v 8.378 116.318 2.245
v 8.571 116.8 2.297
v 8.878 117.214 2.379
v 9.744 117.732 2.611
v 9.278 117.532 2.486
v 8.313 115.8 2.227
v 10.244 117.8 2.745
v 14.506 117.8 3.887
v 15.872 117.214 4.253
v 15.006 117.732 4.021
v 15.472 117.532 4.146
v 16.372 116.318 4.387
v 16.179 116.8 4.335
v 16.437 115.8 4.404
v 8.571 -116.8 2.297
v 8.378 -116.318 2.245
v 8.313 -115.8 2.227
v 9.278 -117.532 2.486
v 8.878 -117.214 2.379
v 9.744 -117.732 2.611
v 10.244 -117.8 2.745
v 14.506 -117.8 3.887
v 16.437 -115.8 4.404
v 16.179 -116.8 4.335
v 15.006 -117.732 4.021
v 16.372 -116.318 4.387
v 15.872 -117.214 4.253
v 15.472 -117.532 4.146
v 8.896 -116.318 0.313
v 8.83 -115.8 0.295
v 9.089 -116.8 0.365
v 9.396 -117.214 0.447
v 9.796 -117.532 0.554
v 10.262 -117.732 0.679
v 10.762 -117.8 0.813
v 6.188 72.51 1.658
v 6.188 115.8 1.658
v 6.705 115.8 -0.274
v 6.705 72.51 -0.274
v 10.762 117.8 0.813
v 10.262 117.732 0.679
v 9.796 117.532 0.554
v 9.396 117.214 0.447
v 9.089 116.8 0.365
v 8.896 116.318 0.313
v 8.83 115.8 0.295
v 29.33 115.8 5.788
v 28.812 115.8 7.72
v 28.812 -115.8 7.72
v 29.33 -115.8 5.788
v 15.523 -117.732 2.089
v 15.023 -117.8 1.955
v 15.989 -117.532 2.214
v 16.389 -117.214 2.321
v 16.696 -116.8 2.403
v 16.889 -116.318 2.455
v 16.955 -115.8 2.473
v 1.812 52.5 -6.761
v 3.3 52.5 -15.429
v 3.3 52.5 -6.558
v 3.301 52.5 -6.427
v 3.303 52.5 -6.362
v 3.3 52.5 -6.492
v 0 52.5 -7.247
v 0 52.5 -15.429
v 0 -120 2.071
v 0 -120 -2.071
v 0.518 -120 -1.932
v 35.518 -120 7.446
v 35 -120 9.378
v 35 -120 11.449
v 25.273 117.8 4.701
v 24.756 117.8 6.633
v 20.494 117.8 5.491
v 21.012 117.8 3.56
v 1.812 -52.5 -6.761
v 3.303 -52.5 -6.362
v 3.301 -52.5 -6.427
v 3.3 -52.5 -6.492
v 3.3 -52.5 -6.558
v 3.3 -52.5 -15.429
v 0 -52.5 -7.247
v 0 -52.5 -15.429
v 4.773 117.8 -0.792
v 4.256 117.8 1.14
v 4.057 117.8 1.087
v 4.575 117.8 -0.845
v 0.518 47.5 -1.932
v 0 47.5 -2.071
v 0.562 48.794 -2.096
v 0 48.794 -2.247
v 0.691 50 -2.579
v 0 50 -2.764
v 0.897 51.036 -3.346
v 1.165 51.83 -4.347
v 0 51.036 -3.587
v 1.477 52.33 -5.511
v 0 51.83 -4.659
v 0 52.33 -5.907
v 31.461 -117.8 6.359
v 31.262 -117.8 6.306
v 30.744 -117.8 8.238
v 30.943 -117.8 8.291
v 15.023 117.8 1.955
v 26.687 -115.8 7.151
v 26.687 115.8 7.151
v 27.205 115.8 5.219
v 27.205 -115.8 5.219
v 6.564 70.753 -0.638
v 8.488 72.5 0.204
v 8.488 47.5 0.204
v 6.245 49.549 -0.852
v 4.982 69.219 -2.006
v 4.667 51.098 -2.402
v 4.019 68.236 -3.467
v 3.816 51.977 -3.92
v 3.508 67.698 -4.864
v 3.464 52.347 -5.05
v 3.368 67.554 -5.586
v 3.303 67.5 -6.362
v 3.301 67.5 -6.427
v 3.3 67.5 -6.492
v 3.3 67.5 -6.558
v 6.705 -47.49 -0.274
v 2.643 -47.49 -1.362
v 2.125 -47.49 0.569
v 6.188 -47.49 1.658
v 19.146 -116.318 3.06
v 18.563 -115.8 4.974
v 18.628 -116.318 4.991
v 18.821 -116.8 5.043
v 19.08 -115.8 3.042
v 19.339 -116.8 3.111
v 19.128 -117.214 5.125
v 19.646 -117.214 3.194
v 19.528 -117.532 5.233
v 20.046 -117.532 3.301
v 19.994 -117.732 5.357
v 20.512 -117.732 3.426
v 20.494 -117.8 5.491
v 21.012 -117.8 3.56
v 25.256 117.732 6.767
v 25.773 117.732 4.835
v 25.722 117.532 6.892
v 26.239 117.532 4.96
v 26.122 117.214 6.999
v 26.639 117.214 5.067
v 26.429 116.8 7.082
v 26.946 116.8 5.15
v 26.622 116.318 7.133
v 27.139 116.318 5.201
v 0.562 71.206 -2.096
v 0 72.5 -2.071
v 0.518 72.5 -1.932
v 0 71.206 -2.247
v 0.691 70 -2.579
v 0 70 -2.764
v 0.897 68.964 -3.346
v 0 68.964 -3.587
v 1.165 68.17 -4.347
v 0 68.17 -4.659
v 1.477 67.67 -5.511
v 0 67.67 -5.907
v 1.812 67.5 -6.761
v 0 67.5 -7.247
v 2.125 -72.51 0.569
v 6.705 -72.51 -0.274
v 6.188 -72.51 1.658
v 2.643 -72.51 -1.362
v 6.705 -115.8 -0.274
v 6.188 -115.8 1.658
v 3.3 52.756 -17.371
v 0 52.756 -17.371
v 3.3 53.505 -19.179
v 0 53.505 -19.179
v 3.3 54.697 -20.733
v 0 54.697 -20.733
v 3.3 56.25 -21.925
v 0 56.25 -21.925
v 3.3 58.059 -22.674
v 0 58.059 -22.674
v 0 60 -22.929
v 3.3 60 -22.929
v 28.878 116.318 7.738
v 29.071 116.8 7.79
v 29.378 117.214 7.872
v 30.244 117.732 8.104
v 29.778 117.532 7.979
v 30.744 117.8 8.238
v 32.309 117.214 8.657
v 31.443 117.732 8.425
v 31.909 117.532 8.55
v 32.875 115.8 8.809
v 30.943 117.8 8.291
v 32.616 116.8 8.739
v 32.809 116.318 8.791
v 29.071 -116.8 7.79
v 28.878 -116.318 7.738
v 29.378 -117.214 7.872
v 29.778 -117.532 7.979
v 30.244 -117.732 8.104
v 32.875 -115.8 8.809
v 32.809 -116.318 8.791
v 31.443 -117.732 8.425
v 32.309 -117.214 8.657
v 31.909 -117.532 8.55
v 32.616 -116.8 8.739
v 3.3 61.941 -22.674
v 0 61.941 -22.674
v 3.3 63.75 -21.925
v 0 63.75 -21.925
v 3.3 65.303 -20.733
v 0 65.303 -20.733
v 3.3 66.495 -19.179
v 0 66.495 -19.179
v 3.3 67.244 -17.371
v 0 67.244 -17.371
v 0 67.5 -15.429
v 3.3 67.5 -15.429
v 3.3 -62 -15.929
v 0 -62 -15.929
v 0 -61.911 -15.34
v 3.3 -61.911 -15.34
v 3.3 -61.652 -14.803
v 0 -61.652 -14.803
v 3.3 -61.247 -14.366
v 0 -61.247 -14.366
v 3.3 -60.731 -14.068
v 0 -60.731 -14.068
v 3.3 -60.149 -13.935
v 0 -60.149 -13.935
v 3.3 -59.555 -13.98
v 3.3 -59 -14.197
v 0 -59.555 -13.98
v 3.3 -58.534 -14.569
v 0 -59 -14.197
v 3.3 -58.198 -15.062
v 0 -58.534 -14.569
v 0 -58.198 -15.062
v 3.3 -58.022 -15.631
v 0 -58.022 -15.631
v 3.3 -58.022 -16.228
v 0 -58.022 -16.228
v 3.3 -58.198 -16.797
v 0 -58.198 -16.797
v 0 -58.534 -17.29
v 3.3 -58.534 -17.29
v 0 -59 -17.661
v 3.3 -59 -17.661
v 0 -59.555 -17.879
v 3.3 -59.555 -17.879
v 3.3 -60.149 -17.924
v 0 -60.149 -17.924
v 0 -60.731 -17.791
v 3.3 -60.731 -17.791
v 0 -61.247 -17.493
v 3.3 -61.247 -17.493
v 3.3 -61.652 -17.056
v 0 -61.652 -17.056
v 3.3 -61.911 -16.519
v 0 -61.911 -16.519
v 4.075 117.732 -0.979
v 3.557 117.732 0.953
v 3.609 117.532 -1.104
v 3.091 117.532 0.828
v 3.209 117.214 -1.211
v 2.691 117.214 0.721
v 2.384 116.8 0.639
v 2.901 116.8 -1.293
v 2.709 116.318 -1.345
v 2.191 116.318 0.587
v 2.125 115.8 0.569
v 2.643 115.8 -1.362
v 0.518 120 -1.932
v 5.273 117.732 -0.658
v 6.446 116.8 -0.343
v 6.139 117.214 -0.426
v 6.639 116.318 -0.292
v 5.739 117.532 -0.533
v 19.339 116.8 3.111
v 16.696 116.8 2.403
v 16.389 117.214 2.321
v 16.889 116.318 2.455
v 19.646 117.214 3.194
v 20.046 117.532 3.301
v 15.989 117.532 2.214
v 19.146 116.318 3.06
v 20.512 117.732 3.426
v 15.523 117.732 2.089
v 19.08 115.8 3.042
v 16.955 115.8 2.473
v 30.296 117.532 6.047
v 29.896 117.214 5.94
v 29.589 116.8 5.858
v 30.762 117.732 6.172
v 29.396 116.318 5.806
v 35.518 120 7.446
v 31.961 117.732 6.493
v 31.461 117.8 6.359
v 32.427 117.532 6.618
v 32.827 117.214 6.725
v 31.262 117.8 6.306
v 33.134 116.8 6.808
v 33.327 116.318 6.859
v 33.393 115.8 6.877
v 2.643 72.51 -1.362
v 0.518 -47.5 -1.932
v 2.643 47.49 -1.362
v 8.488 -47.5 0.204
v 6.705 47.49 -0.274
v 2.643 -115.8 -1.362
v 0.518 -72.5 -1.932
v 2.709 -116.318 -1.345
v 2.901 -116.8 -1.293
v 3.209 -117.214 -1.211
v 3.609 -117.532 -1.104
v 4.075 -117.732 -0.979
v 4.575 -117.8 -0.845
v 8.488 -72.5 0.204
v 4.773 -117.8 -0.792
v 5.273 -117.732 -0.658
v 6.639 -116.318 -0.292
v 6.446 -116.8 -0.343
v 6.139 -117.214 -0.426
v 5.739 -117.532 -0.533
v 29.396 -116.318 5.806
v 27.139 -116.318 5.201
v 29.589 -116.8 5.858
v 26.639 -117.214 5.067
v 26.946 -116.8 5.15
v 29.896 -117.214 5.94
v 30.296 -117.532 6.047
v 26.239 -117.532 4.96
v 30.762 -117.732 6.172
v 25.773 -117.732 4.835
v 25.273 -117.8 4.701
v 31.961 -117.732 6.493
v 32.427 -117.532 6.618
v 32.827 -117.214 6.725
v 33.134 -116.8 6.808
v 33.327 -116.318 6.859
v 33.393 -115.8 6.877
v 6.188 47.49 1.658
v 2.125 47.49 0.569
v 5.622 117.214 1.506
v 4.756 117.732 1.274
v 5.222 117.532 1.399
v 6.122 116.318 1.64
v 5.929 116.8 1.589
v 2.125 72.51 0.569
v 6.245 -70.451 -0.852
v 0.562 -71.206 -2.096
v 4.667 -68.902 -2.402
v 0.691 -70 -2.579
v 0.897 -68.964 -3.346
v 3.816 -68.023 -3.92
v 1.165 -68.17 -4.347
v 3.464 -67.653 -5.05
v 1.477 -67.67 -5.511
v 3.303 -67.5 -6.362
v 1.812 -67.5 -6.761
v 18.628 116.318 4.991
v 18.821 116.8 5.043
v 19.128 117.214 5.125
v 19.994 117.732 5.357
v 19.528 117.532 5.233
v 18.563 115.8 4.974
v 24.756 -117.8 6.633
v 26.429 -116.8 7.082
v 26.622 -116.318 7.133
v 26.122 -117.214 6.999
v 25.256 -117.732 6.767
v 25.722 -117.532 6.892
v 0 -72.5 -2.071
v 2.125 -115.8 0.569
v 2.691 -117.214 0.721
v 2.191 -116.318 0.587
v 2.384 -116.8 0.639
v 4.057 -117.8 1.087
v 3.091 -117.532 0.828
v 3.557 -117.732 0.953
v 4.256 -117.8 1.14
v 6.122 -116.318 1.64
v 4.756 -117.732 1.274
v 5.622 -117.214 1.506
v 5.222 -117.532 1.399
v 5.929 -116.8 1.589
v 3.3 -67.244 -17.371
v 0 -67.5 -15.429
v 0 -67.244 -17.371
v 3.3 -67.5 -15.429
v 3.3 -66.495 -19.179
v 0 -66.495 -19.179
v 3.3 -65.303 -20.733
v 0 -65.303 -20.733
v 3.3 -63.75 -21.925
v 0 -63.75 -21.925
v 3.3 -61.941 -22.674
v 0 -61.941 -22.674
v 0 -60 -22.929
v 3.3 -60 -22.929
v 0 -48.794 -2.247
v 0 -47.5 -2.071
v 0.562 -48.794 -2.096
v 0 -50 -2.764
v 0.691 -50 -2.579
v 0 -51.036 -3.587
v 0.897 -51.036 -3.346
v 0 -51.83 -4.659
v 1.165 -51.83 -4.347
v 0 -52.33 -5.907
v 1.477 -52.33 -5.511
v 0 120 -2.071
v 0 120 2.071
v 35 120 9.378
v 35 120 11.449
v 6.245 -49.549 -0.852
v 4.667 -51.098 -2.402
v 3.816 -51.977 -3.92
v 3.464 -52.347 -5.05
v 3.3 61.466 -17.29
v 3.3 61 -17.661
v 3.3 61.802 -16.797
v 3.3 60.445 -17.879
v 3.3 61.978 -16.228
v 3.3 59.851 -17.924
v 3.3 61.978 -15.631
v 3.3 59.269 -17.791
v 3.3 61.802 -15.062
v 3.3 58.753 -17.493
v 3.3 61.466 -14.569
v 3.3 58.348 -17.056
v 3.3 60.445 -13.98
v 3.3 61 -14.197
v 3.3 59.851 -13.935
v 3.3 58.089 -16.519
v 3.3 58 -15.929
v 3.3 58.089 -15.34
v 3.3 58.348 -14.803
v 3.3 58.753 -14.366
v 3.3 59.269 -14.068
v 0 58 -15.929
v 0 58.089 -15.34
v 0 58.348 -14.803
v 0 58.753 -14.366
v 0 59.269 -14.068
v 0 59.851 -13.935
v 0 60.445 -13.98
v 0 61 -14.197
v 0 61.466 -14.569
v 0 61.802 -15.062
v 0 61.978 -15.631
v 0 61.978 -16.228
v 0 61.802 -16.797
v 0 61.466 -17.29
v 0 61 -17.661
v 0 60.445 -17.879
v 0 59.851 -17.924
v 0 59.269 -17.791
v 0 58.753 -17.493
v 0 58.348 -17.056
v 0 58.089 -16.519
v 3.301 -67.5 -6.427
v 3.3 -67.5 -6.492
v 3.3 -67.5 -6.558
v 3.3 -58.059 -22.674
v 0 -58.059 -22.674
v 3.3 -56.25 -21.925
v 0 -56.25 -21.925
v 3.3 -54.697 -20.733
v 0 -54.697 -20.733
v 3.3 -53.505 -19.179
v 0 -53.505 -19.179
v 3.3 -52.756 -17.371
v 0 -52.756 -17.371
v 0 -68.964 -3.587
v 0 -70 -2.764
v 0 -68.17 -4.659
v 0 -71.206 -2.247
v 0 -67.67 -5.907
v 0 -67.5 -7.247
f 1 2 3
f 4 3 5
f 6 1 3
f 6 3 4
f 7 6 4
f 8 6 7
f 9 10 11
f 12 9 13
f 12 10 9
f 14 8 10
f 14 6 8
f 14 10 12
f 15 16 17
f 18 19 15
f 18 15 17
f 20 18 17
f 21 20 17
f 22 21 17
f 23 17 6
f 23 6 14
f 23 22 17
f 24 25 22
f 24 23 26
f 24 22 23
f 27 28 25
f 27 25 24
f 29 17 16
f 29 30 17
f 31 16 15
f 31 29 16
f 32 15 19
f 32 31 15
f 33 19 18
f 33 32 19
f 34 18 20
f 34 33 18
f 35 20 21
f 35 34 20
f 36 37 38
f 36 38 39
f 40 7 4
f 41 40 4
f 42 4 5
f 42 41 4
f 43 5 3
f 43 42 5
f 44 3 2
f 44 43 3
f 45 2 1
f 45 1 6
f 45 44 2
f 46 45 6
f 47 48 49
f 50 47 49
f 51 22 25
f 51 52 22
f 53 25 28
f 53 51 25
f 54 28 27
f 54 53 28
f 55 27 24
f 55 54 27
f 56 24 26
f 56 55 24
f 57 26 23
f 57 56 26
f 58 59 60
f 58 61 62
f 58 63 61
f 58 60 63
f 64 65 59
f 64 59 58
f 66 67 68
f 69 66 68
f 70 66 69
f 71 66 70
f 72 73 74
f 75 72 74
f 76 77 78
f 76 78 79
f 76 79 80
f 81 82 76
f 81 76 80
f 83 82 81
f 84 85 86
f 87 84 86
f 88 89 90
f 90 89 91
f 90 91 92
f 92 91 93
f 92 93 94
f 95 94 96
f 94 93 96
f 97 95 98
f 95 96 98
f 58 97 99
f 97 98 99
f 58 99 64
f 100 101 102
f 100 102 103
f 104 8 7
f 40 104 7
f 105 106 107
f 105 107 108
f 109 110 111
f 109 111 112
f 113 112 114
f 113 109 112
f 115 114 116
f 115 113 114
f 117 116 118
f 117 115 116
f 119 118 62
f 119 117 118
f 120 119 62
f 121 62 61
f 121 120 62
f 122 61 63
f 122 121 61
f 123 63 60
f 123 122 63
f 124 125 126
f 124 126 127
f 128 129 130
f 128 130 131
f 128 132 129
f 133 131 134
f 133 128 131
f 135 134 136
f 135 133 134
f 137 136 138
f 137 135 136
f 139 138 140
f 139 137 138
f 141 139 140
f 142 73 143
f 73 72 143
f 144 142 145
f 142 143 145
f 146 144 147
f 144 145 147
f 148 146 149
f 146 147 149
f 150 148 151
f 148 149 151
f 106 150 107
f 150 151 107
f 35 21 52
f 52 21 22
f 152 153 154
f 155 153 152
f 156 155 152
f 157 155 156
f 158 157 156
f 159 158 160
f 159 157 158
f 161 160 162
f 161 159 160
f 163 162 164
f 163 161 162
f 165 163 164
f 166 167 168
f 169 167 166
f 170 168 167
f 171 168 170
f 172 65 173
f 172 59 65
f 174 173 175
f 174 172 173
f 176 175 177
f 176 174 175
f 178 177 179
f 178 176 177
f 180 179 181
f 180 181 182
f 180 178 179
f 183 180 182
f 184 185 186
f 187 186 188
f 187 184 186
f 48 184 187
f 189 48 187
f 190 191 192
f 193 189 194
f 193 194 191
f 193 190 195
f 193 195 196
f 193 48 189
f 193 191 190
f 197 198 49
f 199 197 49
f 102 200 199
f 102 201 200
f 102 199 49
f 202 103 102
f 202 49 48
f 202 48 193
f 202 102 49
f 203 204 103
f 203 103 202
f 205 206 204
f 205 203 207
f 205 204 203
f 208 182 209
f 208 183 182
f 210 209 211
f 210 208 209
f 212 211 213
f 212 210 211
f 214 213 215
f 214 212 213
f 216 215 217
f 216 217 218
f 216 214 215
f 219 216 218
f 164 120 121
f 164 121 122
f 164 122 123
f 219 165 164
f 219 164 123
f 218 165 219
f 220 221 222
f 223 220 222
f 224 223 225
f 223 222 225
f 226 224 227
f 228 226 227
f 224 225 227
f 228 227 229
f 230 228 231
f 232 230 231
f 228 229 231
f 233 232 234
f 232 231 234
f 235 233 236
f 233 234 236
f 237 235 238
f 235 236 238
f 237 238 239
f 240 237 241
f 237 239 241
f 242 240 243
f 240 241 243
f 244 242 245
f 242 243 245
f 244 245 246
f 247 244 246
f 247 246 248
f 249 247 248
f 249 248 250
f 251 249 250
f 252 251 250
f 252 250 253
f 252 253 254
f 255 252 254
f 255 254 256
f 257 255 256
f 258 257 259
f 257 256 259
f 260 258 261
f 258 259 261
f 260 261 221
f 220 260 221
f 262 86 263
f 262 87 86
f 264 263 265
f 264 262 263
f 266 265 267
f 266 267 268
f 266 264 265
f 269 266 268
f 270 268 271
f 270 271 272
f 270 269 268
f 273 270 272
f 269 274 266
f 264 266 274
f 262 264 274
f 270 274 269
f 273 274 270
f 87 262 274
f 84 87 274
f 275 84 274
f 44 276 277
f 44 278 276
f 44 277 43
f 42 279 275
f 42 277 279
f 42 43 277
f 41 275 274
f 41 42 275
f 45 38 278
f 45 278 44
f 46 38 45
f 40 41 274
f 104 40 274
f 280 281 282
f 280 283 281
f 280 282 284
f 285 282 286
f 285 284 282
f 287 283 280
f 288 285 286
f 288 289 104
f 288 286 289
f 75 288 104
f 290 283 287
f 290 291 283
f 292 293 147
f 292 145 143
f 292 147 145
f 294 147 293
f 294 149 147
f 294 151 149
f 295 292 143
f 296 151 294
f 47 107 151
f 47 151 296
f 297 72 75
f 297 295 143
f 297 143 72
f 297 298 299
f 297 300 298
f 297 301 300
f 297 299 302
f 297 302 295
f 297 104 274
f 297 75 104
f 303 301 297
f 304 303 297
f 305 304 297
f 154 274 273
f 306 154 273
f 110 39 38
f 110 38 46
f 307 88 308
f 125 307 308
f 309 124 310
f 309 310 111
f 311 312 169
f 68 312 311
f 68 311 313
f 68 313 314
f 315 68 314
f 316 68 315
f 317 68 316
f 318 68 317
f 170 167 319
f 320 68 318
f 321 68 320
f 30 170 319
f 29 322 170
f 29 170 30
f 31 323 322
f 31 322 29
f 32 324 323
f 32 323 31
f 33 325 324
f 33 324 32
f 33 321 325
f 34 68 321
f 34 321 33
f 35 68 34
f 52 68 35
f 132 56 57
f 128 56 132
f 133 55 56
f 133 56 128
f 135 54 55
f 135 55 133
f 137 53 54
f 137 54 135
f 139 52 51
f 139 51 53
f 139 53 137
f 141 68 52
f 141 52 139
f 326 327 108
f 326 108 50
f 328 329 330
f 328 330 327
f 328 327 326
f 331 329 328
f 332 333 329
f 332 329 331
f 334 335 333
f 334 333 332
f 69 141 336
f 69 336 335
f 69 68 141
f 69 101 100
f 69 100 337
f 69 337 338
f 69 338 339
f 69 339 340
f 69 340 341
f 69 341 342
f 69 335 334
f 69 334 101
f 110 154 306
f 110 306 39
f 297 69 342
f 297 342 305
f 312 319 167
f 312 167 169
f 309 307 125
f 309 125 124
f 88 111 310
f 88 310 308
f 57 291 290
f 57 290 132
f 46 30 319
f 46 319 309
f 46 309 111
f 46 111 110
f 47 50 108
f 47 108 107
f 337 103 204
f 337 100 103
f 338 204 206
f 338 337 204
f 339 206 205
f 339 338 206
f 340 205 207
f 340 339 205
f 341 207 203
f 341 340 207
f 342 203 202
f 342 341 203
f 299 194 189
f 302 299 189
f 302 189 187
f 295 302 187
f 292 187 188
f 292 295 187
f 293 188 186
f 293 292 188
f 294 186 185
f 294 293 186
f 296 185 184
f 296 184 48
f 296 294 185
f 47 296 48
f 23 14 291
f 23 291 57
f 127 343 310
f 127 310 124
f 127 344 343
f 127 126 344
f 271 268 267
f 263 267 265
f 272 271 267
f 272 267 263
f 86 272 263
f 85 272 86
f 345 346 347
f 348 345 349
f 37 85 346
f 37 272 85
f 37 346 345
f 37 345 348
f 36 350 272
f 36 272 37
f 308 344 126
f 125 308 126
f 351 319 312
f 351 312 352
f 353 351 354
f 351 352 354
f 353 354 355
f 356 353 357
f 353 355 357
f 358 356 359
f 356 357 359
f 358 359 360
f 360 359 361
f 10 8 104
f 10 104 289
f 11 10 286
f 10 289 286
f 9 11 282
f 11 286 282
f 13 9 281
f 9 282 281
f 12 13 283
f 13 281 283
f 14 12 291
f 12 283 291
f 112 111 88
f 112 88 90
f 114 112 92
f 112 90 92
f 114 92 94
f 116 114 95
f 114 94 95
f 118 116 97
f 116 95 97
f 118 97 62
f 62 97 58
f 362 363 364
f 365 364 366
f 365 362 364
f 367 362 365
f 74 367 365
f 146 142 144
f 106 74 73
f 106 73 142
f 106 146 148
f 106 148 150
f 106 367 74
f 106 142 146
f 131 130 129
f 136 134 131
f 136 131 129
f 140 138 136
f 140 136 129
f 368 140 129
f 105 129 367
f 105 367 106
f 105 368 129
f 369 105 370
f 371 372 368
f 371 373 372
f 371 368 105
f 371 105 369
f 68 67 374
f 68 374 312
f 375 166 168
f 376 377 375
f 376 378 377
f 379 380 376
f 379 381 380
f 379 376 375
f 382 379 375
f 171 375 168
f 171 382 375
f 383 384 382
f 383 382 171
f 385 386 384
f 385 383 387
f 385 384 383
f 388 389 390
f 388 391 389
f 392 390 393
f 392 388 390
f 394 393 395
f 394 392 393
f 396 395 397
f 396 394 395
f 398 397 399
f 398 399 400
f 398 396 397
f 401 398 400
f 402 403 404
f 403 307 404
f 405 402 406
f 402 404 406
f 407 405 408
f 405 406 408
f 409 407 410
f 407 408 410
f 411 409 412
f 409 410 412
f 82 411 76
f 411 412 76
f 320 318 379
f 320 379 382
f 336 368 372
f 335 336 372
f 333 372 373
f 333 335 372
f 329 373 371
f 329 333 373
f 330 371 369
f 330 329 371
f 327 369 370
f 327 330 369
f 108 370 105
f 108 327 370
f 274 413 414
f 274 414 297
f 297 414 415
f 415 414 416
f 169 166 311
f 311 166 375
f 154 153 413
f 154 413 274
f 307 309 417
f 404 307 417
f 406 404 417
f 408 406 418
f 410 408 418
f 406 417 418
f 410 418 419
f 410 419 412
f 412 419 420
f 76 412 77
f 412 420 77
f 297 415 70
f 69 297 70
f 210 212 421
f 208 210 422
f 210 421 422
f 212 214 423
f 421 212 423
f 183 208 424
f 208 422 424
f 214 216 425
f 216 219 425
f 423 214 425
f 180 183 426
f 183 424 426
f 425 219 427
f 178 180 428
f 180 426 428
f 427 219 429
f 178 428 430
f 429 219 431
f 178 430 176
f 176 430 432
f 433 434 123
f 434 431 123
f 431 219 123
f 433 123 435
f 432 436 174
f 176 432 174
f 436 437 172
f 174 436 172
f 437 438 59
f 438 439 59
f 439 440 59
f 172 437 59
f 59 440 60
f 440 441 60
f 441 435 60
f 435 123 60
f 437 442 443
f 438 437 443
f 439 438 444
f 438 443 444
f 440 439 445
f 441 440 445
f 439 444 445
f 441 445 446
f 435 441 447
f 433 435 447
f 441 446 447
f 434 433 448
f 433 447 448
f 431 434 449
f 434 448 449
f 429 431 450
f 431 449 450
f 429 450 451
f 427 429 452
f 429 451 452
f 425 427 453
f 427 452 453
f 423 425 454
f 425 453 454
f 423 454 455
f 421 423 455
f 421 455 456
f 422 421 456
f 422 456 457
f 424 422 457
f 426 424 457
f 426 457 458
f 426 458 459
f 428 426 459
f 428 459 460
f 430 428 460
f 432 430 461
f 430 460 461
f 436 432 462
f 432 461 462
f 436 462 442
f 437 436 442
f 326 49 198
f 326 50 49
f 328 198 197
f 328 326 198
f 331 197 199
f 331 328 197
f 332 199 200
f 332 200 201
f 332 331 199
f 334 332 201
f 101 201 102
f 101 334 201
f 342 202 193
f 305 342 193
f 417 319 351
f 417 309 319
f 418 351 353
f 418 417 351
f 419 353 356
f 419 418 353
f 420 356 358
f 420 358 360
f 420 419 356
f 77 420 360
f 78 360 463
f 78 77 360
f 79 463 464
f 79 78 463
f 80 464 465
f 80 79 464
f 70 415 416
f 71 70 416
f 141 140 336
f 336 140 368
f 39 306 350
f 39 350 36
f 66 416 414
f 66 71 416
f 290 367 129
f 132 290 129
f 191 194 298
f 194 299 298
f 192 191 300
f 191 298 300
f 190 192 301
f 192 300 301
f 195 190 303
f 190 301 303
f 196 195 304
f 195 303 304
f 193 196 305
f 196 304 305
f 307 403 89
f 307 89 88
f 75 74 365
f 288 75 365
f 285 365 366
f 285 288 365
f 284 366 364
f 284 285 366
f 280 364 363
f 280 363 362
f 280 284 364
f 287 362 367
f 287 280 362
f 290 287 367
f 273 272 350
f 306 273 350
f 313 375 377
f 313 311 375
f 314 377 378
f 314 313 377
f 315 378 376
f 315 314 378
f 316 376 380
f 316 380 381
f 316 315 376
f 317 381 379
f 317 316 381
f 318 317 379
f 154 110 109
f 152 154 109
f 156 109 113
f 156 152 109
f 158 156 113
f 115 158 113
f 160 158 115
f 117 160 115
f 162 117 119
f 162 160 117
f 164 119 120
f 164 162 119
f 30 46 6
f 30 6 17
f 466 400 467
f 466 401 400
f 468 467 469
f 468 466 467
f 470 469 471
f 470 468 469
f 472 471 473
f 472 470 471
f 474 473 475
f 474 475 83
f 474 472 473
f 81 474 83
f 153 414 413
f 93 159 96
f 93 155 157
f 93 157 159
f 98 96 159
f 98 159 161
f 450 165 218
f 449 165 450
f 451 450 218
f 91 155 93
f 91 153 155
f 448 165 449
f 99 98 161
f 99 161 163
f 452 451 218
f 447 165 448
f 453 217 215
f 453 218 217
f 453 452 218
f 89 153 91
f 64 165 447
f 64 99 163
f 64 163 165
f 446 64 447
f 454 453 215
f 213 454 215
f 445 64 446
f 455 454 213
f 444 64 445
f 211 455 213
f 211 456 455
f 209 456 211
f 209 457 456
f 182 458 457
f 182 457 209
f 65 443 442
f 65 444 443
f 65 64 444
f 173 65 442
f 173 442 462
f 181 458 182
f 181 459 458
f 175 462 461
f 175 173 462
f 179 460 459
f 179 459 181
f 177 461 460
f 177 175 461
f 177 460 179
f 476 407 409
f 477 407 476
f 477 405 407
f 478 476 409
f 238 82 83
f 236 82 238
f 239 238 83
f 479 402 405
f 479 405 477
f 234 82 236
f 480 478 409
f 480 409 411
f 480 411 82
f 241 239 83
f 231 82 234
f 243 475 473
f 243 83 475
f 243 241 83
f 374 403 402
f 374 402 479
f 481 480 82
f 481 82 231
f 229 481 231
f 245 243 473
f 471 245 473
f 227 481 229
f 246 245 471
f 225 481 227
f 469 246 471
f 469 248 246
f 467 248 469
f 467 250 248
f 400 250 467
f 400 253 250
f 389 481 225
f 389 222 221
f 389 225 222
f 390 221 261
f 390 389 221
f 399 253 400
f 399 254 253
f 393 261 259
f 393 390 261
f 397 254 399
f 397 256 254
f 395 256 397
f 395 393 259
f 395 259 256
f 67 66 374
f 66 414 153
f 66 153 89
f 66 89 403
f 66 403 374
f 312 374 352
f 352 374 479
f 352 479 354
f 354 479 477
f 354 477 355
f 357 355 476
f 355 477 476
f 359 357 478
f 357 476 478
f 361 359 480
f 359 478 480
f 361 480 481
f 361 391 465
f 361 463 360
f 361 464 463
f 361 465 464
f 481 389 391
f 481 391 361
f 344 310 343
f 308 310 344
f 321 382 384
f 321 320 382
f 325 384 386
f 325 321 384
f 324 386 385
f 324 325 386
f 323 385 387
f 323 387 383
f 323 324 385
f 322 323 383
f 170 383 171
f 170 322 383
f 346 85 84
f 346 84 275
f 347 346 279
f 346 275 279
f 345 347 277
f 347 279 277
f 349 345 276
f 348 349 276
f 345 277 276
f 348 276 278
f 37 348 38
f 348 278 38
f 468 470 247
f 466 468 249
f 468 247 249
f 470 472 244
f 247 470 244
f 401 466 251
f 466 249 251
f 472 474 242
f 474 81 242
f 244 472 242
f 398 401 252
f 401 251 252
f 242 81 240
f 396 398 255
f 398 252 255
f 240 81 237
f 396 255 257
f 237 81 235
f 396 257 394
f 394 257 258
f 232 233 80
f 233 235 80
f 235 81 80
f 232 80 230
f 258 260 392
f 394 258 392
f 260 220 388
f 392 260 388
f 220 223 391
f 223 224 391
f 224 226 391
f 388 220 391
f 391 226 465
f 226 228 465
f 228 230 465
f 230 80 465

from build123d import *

# Parameters (mm, degrees)
F2_DEPTH  = 120
F3_W      = 36.2346663144
F3_H      = 240
F3_W_2    = 2.2
F3_H_2    = 235.6
F4_DEPTH  = 2
F5_R      = 2
F7_DEPTH  = 240
F8_W      = 15
F8_H      = 4.1411047216
F8_H_2    = 20.8588952784
F8_R      = 2
F9_DEPTH  = 3.3
F10_R     = 7.49999
F11_W     = 2.2
F11_H     = 25.02
F12_DEPTH = 2
F13_R     = 5
F14_R     = 7


# Not quite as in the source:
# - a fillet or chamfer is up to 0.001 mm smaller than in the source, because OpenCascade refuses the exact size
# - a feature names something its author has since deleted; it is built from what else it names


with BuildPart() as f2:
    # F1 (on Front) → F2 (new body, symmetric)
    with BuildSketch(Plane.XZ):
        Polygon((35, 11.4487740959), (0, 2.0705523608), (0, 0), (35, 9.3782217351), align=None)
    extrude(amount=F2_DEPTH, both=True)

    # F3 (on face) → F4 (join)
    with BuildSketch(Plane(origin=(0, 0, 0), x_dir=(0.9659258263, 0, 0.2588190451), z_dir=(0.2588190451, 0, -0.9659258263))):
        with Locations((18.1173331572, 0)):
            Rectangle(F3_W, F3_H)
        Polygon((2.2, -117.8), (2.2, 117.8), (6.4057777191, 117.8), (8.6057777191, 117.8), (17.0173331572, 117.8), (19.2173331572, 117.8), (27.6288885953, 117.8), (29.8288885953, 117.8), (34.0346663144, 117.8), (34.0346663144, -117.8), (29.8288885953, -117.8), (27.6288885953, -117.8), (19.2173331572, -117.8), (17.0173331572, -117.8), (8.6057777191, -117.8), (6.4057777191, -117.8), align=None, mode=Mode.SUBTRACT)
        with Locations((28.7288885953, 0)):
            Rectangle(F3_W_2, F3_H_2)
        with Locations((18.1173331572, 0)):
            Rectangle(F3_W_2, F3_H_2)
        with Locations((7.5057777191, 0)):
            Rectangle(F3_W_2, F3_H_2)
    extrude(amount=F4_DEPTH)

    # F5
    f5_edges = [f2.edges().sort_by_distance(p)[0] for p in [
        (33.133782, -117.8, 7.842894),
        (26.946276, -117.8, 6.184957),
        (16.696301, -117.8, 3.438484),
        (6.446325, -117.8, 0.692011),
        (29.071313, -117.8, 6.754359),
        (18.821337, -117.8, 4.007886),
        (8.571362, -117.8, 1.261413),
        (2.383856, -117.8, -0.396524),
        (2.383856, 117.8, -0.396524),
        (8.571362, 117.8, 1.261413),
        (18.821337, 117.8, 4.007886),
        (29.071313, 117.8, 6.754359),
        (33.133782, 117.8, 7.842894),
        (16.696301, 117.8, 3.438484),
        (6.446325, 117.8, 0.692011),
        (26.946276, 117.8, 6.184957),
    ]]
    fillet(f5_edges, radius=F5_R)

    # F6 (on face) → F7 (join, through all)
    with BuildSketch(Plane.XZ.offset(120)):
        Polygon((0, -2.0705523608), (0.5176380902, -1.9318516526), (0, 0), align=None)
    extrude(amount=-F7_DEPTH)

    # F8 (on face) → F9 (join)
    with BuildSketch(Plane(origin=(0, 0, 0), x_dir=(0, -1, 0), z_dir=(-1, 0, 0))):
        with Locations((-60, 0)):
            Rectangle(F8_W, F8_H)
        with Locations((-60, -12.5)):
            Rectangle(F8_W, F8_H_2)
        with Locations((-60, -15.9294476392)):
            Circle(F8_R, mode=Mode.SUBTRACT)
        with Locations((60, 0)):
            Rectangle(F8_W, F8_H)
        with Locations((60, -12.5)):
            Rectangle(F8_W, F8_H_2)
        with Locations((60, -15.9294476392)):
            Circle(F8_R, mode=Mode.SUBTRACT)
    extrude(amount=-F9_DEPTH)

    # F10 (radius 7.5 in the source; OpenCascade refuses exactly that, so slightly less here)
    f10_edges = [f2.edges().sort_by_distance(p)[0] for p in [
        (1.65, 67.5, -22.929448),
        (1.65, 52.5, -22.929448),
        (1.65, -52.5, -22.929448),
        (1.65, -67.5, -22.929448),
    ]]
    fillet(f10_edges, radius=F10_R)

    # F11 (on face) → F12 (join, through all)
    with BuildSketch(Plane(origin=(0.5176380902, 0, -1.9318516526), x_dir=(0.9659258263, 0, 0.2588190451), z_dir=(0.2588190451, 0, -0.9659258263))):
        Polygon((6.4057777191, -47.49), (2.2, -47.49), (2.2, -52.5), (2.2, -67.5), (2.2, -72.51), (6.4057777191, -72.51), align=None)
        with Locations((7.5057777191, -60)):
            Rectangle(F11_W, F11_H)
        Polygon((2.2, 52.5), (2.2, 47.49), (6.4057777191, 47.49), (6.4057777191, 72.51), (2.2, 72.51), (2.2, 67.5), align=None)
        with Locations((7.5057777191, 60)):
            Rectangle(F11_W, F11_H)
    extrude(amount=-F12_DEPTH)

    # F13
    f13_edges = [f2.edges().sort_by_distance(p)[0] for p in [
        (1.65, -52.5, -1.628436),
        (1.65, -67.5, -1.628436),
        (1.65, 52.5, -1.628436),
        (1.65, 67.5, -1.628436),
    ]]
    fillet(f13_edges, radius=F13_R)

    # F14
    f14_edges = [f2.edges().sort_by_distance(p)[0] for p in [
        (3.3, 60, -1.18632),
        (3.3, -60, -1.18632),
    ]]
    fillet(f14_edges, radius=F14_R)


solid = f2.part
